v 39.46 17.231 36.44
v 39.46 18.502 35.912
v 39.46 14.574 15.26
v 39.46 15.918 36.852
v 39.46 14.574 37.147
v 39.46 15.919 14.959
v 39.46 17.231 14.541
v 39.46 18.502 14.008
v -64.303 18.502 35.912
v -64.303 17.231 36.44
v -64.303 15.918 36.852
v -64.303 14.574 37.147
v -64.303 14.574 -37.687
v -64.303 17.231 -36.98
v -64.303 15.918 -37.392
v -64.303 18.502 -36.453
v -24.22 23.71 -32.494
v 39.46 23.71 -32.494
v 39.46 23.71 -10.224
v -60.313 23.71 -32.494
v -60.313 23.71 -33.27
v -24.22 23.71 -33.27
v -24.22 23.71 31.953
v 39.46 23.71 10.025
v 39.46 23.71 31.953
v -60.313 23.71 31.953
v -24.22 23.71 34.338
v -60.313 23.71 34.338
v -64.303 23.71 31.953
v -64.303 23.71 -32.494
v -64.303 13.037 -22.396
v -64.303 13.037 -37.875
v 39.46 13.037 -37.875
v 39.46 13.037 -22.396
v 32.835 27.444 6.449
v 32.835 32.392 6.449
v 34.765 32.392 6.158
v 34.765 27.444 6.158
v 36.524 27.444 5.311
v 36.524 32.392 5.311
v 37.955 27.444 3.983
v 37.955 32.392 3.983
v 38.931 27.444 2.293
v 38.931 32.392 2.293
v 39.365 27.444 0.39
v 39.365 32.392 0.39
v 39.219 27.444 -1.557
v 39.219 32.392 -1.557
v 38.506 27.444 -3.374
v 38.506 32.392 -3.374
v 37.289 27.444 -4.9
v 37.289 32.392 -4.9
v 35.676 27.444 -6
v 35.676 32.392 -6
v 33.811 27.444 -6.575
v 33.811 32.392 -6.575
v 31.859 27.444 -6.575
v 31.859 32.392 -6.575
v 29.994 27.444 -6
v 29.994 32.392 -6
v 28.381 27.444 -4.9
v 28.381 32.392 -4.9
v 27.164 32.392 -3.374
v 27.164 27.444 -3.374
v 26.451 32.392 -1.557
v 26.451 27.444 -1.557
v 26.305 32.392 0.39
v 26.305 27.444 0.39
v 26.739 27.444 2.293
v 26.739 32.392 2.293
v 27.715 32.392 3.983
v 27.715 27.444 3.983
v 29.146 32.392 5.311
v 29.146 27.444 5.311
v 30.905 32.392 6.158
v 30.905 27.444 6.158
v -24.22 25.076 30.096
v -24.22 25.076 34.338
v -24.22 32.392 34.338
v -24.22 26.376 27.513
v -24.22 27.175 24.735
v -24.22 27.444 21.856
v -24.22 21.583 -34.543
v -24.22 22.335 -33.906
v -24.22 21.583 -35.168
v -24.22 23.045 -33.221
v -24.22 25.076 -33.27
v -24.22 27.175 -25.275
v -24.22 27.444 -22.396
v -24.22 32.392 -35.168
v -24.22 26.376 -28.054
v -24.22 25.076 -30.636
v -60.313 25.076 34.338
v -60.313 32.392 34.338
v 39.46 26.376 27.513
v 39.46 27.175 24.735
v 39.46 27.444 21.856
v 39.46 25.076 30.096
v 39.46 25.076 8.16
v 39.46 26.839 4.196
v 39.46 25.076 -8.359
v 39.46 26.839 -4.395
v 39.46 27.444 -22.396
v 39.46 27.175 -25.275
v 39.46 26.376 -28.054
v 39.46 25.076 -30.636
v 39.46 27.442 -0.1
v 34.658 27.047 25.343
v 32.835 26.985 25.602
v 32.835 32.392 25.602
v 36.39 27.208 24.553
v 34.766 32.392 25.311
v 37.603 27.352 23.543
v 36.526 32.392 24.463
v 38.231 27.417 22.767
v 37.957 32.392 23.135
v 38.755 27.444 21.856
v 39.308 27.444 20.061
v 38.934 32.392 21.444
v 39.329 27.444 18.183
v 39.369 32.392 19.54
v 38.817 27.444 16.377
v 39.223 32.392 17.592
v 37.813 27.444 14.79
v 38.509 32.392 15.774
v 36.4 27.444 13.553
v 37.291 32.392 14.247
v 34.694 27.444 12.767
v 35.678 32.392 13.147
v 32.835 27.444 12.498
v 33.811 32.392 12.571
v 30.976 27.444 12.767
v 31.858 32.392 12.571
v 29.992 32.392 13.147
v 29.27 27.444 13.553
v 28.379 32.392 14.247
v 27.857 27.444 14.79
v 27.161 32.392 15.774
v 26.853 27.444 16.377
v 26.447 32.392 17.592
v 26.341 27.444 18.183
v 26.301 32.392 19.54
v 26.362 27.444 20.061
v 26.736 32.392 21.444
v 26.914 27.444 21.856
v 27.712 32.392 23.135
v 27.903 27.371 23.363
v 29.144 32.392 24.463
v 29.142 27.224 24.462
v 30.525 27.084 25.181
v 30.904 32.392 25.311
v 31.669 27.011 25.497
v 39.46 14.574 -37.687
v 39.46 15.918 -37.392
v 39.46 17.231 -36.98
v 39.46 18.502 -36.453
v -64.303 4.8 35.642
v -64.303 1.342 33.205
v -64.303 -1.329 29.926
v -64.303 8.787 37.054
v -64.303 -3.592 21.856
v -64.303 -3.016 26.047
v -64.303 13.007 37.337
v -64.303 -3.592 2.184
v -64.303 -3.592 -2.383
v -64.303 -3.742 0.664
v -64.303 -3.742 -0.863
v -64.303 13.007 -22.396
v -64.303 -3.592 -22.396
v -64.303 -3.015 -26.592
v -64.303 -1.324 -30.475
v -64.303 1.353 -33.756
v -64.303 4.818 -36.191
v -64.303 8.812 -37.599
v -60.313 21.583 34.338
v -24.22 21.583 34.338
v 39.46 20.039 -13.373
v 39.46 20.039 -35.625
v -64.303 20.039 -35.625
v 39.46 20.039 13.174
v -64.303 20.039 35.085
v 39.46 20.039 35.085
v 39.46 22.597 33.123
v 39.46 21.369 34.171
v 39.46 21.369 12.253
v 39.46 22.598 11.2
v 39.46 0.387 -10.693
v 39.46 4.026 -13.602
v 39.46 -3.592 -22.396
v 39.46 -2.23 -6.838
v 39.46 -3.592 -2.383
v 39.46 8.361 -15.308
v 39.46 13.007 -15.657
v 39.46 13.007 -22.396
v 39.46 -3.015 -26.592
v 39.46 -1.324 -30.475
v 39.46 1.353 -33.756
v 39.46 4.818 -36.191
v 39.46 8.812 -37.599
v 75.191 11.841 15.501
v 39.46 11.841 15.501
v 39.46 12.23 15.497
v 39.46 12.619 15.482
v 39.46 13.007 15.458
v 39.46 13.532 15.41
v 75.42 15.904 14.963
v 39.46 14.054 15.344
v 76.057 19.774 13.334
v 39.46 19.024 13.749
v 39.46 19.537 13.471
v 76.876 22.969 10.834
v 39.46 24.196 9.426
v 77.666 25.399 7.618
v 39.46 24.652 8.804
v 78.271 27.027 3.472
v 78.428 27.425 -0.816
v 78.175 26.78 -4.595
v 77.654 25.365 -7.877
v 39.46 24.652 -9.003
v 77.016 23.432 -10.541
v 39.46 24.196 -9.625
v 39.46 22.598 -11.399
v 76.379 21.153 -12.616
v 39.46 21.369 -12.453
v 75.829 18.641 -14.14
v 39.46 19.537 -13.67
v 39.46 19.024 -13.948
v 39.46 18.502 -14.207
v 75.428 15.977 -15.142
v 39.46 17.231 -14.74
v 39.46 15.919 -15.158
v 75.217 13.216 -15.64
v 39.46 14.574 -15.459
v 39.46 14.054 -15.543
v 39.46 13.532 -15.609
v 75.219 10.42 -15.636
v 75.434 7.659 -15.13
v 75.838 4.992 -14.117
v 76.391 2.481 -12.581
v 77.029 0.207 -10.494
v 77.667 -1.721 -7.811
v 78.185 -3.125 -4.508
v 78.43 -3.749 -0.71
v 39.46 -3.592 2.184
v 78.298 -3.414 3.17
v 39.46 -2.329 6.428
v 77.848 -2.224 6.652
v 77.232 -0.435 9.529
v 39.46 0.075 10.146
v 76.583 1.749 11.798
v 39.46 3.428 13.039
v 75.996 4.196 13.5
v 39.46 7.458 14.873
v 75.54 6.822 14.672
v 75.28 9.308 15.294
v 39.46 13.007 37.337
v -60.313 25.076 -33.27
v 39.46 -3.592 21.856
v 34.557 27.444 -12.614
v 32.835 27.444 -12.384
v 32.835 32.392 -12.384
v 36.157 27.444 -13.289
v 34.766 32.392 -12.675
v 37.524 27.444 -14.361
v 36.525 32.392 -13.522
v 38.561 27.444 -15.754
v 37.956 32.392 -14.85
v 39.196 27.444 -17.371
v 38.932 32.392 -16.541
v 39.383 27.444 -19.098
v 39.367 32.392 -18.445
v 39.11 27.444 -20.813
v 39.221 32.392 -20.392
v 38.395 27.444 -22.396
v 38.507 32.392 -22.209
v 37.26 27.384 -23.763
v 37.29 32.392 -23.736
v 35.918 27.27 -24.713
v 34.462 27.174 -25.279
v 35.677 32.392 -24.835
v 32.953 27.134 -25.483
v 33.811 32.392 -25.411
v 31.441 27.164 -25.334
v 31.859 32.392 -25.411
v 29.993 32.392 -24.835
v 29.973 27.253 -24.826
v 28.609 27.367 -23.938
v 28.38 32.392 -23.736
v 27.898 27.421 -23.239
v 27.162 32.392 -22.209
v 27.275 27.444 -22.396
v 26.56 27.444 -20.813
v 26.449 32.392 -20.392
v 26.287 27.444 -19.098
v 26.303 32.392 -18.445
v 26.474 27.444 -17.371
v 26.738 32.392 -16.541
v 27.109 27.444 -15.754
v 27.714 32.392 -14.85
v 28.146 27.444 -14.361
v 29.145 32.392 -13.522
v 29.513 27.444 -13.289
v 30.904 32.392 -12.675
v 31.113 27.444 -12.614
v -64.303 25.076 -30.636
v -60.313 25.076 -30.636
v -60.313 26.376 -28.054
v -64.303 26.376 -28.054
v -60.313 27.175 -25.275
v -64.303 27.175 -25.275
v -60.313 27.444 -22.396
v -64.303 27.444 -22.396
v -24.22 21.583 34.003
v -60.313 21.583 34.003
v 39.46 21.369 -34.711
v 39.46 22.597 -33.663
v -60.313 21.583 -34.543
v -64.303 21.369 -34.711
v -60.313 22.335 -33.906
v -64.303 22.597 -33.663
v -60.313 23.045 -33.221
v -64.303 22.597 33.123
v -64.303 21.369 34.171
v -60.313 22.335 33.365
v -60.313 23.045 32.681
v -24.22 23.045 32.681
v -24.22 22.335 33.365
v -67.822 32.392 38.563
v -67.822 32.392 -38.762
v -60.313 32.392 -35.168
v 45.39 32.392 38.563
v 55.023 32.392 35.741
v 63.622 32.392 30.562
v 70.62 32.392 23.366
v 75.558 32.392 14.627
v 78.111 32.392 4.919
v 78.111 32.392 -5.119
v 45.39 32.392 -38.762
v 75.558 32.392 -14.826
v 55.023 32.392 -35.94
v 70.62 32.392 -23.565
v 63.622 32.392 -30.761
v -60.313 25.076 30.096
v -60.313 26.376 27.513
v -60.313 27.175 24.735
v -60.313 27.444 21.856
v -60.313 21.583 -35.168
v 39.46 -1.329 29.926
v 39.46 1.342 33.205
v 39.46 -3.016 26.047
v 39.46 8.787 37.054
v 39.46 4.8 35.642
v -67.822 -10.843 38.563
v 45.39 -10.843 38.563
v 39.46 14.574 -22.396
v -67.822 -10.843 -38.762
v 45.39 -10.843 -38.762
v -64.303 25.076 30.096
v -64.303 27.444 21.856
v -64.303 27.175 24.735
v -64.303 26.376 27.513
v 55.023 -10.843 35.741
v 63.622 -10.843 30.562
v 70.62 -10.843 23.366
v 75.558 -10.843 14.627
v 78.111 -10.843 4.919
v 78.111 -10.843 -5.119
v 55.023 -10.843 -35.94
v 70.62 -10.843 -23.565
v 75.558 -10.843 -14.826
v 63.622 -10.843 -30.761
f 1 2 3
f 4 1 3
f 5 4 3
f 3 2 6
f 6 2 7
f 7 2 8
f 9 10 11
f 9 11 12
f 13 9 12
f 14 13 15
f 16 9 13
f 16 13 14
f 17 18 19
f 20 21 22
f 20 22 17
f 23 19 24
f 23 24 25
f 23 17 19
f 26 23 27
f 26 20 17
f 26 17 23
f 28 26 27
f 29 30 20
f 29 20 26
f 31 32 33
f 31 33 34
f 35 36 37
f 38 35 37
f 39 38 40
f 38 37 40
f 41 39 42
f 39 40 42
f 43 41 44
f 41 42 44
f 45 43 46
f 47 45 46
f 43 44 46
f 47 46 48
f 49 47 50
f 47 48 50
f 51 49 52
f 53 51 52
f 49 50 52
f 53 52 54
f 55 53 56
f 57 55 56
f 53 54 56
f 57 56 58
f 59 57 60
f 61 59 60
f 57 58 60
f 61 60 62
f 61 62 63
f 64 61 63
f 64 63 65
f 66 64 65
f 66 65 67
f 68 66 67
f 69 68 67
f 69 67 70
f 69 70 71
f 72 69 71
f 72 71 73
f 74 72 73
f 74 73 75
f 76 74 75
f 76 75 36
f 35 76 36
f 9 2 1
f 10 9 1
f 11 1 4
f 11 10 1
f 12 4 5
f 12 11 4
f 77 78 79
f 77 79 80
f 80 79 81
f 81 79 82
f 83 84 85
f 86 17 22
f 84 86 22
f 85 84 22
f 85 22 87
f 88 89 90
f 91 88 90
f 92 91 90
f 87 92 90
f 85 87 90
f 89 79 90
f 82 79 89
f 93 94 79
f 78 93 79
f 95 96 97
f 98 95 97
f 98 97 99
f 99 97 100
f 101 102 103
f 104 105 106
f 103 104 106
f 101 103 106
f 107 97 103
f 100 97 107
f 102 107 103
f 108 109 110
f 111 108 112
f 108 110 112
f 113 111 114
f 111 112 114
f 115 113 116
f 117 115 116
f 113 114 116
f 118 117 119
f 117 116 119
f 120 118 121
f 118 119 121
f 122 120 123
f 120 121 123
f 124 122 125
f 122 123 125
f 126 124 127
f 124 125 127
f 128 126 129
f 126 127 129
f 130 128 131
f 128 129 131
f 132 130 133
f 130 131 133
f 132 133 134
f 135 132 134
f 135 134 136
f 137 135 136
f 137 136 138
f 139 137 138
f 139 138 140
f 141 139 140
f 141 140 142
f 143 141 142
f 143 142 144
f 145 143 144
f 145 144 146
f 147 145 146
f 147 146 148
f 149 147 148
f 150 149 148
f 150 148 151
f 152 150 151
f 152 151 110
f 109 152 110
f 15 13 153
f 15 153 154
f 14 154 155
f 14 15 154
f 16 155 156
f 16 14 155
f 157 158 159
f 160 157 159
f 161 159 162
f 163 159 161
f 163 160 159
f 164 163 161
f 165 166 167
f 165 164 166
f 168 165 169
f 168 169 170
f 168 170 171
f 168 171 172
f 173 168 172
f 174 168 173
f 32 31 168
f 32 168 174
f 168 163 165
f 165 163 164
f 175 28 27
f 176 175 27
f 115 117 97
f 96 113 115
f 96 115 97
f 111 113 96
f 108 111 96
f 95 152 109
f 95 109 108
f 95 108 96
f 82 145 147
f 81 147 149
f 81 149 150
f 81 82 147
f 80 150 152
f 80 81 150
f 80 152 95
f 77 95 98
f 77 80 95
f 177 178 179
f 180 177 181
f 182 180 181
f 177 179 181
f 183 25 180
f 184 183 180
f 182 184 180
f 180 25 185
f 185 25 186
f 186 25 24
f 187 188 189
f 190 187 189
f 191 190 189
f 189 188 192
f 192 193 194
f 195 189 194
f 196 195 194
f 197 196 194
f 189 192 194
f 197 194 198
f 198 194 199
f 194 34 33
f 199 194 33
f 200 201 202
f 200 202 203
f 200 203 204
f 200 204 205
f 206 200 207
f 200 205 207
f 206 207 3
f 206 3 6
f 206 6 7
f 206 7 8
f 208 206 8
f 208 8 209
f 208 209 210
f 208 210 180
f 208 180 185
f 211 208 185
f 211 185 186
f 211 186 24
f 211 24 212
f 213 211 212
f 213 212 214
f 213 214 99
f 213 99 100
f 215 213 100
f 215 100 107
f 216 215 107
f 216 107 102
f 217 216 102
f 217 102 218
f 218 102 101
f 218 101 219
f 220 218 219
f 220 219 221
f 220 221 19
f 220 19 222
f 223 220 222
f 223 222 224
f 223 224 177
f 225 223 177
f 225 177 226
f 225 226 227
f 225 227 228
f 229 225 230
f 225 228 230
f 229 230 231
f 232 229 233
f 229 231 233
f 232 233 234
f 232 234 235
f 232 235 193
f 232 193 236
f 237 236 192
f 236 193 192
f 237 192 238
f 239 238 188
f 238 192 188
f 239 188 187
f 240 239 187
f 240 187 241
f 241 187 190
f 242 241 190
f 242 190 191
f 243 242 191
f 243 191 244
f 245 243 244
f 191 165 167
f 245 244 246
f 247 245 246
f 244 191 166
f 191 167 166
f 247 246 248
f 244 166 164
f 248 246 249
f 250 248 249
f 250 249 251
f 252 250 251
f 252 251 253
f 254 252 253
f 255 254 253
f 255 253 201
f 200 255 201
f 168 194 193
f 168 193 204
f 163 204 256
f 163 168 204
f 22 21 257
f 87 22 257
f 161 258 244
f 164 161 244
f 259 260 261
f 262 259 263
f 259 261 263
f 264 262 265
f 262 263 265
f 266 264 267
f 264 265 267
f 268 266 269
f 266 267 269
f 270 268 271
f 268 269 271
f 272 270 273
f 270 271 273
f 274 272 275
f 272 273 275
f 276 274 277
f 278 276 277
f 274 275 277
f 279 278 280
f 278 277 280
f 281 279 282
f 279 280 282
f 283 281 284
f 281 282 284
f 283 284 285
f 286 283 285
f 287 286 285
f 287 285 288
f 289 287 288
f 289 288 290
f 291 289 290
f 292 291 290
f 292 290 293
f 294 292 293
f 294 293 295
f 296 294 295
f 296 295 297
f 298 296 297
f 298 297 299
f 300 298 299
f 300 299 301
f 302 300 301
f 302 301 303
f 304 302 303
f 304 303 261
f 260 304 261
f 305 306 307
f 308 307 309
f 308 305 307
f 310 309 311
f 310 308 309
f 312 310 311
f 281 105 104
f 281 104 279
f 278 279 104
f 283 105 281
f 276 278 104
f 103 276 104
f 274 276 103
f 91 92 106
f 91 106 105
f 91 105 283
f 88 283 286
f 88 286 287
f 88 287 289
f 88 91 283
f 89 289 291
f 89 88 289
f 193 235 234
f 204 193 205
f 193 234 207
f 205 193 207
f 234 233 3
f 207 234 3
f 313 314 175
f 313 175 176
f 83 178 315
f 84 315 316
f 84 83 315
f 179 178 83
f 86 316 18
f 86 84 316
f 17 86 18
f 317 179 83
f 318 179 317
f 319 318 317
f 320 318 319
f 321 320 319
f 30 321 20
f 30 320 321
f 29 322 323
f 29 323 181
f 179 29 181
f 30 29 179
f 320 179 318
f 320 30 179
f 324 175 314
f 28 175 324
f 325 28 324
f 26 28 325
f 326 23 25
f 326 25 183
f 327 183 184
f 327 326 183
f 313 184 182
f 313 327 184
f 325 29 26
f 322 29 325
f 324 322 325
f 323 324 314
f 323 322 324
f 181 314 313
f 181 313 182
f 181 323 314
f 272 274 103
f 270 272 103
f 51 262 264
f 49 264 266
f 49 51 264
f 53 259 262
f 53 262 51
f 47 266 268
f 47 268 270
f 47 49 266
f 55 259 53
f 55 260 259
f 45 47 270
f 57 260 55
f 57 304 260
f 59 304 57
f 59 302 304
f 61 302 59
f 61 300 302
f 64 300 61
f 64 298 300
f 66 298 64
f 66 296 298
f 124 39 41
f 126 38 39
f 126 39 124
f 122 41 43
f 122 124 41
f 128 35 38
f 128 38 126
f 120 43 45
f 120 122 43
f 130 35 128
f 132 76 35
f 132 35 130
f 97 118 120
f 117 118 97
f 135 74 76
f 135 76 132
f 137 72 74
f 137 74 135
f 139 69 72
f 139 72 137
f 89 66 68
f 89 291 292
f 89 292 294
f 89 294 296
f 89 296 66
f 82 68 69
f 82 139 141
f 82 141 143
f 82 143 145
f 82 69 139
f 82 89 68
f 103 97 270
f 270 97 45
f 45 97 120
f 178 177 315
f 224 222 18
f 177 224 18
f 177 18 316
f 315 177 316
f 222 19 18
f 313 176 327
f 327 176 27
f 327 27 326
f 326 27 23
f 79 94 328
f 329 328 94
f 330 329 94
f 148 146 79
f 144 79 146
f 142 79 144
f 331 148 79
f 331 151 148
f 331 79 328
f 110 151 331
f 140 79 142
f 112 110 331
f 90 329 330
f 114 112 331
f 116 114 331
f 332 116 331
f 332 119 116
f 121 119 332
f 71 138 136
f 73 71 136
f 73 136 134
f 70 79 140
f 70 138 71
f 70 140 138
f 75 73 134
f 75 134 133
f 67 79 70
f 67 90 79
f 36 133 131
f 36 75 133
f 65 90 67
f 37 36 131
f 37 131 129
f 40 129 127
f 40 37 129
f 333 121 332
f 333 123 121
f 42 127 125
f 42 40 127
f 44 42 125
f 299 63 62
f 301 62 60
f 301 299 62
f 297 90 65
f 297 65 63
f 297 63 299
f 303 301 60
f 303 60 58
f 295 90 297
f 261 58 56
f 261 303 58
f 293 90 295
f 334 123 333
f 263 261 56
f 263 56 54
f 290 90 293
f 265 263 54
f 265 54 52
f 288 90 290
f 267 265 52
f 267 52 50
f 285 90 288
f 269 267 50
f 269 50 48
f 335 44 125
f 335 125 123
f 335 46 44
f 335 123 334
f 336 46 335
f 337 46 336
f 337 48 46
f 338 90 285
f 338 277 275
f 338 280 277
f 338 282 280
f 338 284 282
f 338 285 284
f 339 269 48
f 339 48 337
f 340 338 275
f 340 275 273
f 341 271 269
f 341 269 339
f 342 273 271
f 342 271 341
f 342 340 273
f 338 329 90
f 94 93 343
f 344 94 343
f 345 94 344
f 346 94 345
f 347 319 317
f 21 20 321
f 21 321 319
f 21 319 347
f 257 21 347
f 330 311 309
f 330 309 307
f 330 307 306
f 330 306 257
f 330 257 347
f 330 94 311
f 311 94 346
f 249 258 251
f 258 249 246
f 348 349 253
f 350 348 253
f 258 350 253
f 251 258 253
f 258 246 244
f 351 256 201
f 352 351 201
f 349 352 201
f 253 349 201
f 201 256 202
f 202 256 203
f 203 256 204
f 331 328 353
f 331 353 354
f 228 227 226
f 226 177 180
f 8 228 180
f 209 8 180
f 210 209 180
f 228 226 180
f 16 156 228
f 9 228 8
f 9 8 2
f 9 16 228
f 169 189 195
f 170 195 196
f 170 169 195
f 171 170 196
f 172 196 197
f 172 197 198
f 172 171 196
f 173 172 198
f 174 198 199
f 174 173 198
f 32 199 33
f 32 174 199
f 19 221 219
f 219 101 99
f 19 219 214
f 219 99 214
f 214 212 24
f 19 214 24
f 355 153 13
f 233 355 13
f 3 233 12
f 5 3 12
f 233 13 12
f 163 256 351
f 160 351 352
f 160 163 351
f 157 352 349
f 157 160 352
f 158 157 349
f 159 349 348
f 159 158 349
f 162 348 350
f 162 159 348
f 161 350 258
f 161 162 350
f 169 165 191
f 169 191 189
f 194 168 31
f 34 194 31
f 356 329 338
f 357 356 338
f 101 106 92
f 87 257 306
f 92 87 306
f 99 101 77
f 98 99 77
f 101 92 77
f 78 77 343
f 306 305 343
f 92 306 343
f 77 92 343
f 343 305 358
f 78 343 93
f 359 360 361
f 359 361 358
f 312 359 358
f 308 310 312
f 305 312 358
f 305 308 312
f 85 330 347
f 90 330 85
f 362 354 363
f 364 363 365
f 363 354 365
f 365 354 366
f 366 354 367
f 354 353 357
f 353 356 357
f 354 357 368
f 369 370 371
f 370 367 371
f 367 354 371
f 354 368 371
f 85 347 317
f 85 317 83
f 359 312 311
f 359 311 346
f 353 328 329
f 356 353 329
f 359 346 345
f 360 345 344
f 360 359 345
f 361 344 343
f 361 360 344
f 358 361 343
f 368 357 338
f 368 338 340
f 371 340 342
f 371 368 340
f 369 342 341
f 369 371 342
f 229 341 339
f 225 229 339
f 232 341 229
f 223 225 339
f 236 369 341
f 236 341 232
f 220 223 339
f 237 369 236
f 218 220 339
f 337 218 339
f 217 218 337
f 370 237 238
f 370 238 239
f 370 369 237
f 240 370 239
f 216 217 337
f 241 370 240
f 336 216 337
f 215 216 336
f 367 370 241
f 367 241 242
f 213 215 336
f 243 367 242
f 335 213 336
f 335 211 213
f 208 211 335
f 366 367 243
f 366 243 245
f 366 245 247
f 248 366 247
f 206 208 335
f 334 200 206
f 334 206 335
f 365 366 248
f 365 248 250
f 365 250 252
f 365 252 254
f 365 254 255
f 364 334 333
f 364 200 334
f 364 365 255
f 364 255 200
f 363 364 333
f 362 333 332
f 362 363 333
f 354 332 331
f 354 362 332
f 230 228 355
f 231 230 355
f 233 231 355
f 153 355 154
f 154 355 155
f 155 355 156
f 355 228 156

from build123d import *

# Parameters (mm, degrees)
SKETCH_4_W          = 50.742886584
SKETCH_4_H          = 35.769575788
EXTRUDE_3_DEPTH     = 20
CUT_EXTRUDE_1_DEPTH = 48
SKETCH_6_R          = 7.216894088
CUT_EXTRUDE_2_DEPTH = 68
SKETCH_7_W          = 16.696122742
SKETCH_7_H          = 32.152795324
CUT_EXTRUDE_4_DEPTH = 5
SKETCH_8_R          = 3.029228208
SKETCH_8_R_2        = 3.03
SKETCH_8_R_3        = 3.03083806
CUT_EXTRUDE_5_DEPTH = 3
SKETCH_9_W          = 5.030083898
SKETCH_9_H          = 0.631944611
SKETCH_9_W_2        = 7.178609771
SKETCH_9_H_2        = 0.710937687
SKETCH_9_W_3        = 7.570466712
EXTRUDE_5_DEPTH     = 48
SKETCH_10_W         = 27.632027184
SKETCH_10_H         = 0.724840375
SKETCH_10_H_2       = 0.710937687
SKETCH_10_H_3       = 0.631944611
EXTRUDE_6_DEPTH     = 48
SKETCH_13_W         = 1.627827619
SKETCH_13_H         = 35.769575788
EXTRUDE_9_DEPTH     = 20
SKETCH_15_W         = 1.627827619
SKETCH_15_H         = 32.092623512
EXTRUDE_11_DEPTH    = 20
SCALE_1_SCALE       = 2.16174


with BuildPart() as part:
    # 草图4 → 凸台-拉伸3 (new body)
    with BuildSketch(Plane(origin=(0, 0, 0), x_dir=(1, 0, 0), z_dir=(0, 1, 0))):
        Rectangle(SKETCH_4_W, SKETCH_4_H)
        with BuildLine():
            ThreePointArc((25.371443292, 17.884787894), (40.657584716, 0), (25.371443292, -17.884787894))
            Line((25.371443292, -17.884787894), (25.371443292, 17.884787894))
        make_face()
    extrude(amount=EXTRUDE_3_DEPTH)

    # 草图5 → 切除-拉伸1 (cut)
    with BuildSketch(Plane.ZY.offset(25.371443292)):
        with BuildLine():
            Line((-10.314321182, 17.711089067), (10.156549539, 17.711089067))
            ThreePointArc((10.156549539, 17.711089067), (17.33515931, 10.532479296), (10.156549539, 3.353869525))
            Line((10.156549539, 3.353869525), (-10.314321182, 3.353869525))
            ThreePointArc((-10.314321182, 3.353869525), (-17.492930953, 10.532479296), (-10.314321182, 17.711089067))
        make_face()
    extrude(amount=-CUT_EXTRUDE_1_DEPTH, mode=Mode.SUBTRACT)

    # 草图6 → 切除-拉伸2 (cut)
    with BuildSketch(Plane.ZY.offset(25.371443292)):
        with Locations((0, 10.493036385)):
            Circle(SKETCH_6_R)
    extrude(amount=-CUT_EXTRUDE_2_DEPTH, mode=Mode.SUBTRACT)

    # 草图7 → 切除-拉伸4 (cut)
    with BuildSketch(Plane(origin=(0, 20, 0), x_dir=(1, 0, 0), z_dir=(0, 1, 0))):
        with Locations((-15.177393996, 0.145817666)):
            Rectangle(SKETCH_7_W, SKETCH_7_H)
    extrude(amount=-CUT_EXTRUDE_4_DEPTH, mode=Mode.SUBTRACT)

    # 草图8 → 切除-拉伸5 (cut)
    with BuildSketch(Plane(origin=(0, 20, 0), x_dir=(1, 0, 0), z_dir=(0, 1, 0))):
        with Locations(Location((19.563664897, 0, 0), (0, 0, 270))):
            Circle(SKETCH_8_R)
        with Locations(Location((19.563664897, 8.712605536, 0), (0, 0, 270))):
            Circle(SKETCH_8_R_2)
        with Locations(Location((19.563664897, -8.858423201, 0), (0, 0, 270))):
            Circle(SKETCH_8_R_3)
    extrude(amount=-CUT_EXTRUDE_5_DEPTH, mode=Mode.SUBTRACT)

    # 草图9 → 凸台-拉伸5 (add)
    with BuildSketch(Plane.ZY.offset(25.371443292)):
        with Locations((-12.829363131, 16.299697839)):
            Rectangle(SKETCH_9_W, SKETCH_9_H)
        with Locations((-13.903626068, 13.929905549)):
            Rectangle(SKETCH_9_W_2, SKETCH_9_H_2)
        with Locations((-14.099554538, 11.402127105)):
            Rectangle(SKETCH_9_W_3, SKETCH_9_H_2)
    extrude(amount=-EXTRUDE_5_DEPTH)

    # 草图10 → 凸台-拉伸6 (add)
    with BuildSketch(Plane.ZY.offset(25.371443292)):
        with Locations((3.50169241, 11.395175762)):
            Rectangle(SKETCH_10_W, SKETCH_10_H)
        with Locations((3.50169241, 13.929905549)):
            Rectangle(SKETCH_10_W, SKETCH_10_H_2)
        with Locations((3.50169241, 16.299697839)):
            Rectangle(SKETCH_10_W, SKETCH_10_H_3)
    extrude(amount=-EXTRUDE_6_DEPTH)

    # 草图13 → 凸台-拉伸9 (add)
    with BuildSketch(Plane(origin=(0, 20, 0), x_dir=(1, 0, 0), z_dir=(0, 1, 0))):
        with Locations((-26.185357102, 0)):
            Rectangle(SKETCH_13_W, SKETCH_13_H)
    extrude(amount=-EXTRUDE_9_DEPTH)

    # 草图15 → 凸台-拉伸11 (add, through all)
    with BuildSketch(Plane(origin=(0, 20, 0), x_dir=(1, 0, 0), z_dir=(0, 1, 0))):
        with Locations((-26.185357102, 0.07480798)):
            Rectangle(SKETCH_15_W, SKETCH_15_H)
    extrude(amount=-EXTRUDE_11_DEPTH)


with BuildPart() as part_1:
    # 缩放比例1: scaled about (8.140035626, 9.333116532, 0.085734306)
    add(part.part.scale(SCALE_1_SCALE).moved(Location((-9.456604988, -10.8426548, -0.099600973))))


solid = part_1.part
